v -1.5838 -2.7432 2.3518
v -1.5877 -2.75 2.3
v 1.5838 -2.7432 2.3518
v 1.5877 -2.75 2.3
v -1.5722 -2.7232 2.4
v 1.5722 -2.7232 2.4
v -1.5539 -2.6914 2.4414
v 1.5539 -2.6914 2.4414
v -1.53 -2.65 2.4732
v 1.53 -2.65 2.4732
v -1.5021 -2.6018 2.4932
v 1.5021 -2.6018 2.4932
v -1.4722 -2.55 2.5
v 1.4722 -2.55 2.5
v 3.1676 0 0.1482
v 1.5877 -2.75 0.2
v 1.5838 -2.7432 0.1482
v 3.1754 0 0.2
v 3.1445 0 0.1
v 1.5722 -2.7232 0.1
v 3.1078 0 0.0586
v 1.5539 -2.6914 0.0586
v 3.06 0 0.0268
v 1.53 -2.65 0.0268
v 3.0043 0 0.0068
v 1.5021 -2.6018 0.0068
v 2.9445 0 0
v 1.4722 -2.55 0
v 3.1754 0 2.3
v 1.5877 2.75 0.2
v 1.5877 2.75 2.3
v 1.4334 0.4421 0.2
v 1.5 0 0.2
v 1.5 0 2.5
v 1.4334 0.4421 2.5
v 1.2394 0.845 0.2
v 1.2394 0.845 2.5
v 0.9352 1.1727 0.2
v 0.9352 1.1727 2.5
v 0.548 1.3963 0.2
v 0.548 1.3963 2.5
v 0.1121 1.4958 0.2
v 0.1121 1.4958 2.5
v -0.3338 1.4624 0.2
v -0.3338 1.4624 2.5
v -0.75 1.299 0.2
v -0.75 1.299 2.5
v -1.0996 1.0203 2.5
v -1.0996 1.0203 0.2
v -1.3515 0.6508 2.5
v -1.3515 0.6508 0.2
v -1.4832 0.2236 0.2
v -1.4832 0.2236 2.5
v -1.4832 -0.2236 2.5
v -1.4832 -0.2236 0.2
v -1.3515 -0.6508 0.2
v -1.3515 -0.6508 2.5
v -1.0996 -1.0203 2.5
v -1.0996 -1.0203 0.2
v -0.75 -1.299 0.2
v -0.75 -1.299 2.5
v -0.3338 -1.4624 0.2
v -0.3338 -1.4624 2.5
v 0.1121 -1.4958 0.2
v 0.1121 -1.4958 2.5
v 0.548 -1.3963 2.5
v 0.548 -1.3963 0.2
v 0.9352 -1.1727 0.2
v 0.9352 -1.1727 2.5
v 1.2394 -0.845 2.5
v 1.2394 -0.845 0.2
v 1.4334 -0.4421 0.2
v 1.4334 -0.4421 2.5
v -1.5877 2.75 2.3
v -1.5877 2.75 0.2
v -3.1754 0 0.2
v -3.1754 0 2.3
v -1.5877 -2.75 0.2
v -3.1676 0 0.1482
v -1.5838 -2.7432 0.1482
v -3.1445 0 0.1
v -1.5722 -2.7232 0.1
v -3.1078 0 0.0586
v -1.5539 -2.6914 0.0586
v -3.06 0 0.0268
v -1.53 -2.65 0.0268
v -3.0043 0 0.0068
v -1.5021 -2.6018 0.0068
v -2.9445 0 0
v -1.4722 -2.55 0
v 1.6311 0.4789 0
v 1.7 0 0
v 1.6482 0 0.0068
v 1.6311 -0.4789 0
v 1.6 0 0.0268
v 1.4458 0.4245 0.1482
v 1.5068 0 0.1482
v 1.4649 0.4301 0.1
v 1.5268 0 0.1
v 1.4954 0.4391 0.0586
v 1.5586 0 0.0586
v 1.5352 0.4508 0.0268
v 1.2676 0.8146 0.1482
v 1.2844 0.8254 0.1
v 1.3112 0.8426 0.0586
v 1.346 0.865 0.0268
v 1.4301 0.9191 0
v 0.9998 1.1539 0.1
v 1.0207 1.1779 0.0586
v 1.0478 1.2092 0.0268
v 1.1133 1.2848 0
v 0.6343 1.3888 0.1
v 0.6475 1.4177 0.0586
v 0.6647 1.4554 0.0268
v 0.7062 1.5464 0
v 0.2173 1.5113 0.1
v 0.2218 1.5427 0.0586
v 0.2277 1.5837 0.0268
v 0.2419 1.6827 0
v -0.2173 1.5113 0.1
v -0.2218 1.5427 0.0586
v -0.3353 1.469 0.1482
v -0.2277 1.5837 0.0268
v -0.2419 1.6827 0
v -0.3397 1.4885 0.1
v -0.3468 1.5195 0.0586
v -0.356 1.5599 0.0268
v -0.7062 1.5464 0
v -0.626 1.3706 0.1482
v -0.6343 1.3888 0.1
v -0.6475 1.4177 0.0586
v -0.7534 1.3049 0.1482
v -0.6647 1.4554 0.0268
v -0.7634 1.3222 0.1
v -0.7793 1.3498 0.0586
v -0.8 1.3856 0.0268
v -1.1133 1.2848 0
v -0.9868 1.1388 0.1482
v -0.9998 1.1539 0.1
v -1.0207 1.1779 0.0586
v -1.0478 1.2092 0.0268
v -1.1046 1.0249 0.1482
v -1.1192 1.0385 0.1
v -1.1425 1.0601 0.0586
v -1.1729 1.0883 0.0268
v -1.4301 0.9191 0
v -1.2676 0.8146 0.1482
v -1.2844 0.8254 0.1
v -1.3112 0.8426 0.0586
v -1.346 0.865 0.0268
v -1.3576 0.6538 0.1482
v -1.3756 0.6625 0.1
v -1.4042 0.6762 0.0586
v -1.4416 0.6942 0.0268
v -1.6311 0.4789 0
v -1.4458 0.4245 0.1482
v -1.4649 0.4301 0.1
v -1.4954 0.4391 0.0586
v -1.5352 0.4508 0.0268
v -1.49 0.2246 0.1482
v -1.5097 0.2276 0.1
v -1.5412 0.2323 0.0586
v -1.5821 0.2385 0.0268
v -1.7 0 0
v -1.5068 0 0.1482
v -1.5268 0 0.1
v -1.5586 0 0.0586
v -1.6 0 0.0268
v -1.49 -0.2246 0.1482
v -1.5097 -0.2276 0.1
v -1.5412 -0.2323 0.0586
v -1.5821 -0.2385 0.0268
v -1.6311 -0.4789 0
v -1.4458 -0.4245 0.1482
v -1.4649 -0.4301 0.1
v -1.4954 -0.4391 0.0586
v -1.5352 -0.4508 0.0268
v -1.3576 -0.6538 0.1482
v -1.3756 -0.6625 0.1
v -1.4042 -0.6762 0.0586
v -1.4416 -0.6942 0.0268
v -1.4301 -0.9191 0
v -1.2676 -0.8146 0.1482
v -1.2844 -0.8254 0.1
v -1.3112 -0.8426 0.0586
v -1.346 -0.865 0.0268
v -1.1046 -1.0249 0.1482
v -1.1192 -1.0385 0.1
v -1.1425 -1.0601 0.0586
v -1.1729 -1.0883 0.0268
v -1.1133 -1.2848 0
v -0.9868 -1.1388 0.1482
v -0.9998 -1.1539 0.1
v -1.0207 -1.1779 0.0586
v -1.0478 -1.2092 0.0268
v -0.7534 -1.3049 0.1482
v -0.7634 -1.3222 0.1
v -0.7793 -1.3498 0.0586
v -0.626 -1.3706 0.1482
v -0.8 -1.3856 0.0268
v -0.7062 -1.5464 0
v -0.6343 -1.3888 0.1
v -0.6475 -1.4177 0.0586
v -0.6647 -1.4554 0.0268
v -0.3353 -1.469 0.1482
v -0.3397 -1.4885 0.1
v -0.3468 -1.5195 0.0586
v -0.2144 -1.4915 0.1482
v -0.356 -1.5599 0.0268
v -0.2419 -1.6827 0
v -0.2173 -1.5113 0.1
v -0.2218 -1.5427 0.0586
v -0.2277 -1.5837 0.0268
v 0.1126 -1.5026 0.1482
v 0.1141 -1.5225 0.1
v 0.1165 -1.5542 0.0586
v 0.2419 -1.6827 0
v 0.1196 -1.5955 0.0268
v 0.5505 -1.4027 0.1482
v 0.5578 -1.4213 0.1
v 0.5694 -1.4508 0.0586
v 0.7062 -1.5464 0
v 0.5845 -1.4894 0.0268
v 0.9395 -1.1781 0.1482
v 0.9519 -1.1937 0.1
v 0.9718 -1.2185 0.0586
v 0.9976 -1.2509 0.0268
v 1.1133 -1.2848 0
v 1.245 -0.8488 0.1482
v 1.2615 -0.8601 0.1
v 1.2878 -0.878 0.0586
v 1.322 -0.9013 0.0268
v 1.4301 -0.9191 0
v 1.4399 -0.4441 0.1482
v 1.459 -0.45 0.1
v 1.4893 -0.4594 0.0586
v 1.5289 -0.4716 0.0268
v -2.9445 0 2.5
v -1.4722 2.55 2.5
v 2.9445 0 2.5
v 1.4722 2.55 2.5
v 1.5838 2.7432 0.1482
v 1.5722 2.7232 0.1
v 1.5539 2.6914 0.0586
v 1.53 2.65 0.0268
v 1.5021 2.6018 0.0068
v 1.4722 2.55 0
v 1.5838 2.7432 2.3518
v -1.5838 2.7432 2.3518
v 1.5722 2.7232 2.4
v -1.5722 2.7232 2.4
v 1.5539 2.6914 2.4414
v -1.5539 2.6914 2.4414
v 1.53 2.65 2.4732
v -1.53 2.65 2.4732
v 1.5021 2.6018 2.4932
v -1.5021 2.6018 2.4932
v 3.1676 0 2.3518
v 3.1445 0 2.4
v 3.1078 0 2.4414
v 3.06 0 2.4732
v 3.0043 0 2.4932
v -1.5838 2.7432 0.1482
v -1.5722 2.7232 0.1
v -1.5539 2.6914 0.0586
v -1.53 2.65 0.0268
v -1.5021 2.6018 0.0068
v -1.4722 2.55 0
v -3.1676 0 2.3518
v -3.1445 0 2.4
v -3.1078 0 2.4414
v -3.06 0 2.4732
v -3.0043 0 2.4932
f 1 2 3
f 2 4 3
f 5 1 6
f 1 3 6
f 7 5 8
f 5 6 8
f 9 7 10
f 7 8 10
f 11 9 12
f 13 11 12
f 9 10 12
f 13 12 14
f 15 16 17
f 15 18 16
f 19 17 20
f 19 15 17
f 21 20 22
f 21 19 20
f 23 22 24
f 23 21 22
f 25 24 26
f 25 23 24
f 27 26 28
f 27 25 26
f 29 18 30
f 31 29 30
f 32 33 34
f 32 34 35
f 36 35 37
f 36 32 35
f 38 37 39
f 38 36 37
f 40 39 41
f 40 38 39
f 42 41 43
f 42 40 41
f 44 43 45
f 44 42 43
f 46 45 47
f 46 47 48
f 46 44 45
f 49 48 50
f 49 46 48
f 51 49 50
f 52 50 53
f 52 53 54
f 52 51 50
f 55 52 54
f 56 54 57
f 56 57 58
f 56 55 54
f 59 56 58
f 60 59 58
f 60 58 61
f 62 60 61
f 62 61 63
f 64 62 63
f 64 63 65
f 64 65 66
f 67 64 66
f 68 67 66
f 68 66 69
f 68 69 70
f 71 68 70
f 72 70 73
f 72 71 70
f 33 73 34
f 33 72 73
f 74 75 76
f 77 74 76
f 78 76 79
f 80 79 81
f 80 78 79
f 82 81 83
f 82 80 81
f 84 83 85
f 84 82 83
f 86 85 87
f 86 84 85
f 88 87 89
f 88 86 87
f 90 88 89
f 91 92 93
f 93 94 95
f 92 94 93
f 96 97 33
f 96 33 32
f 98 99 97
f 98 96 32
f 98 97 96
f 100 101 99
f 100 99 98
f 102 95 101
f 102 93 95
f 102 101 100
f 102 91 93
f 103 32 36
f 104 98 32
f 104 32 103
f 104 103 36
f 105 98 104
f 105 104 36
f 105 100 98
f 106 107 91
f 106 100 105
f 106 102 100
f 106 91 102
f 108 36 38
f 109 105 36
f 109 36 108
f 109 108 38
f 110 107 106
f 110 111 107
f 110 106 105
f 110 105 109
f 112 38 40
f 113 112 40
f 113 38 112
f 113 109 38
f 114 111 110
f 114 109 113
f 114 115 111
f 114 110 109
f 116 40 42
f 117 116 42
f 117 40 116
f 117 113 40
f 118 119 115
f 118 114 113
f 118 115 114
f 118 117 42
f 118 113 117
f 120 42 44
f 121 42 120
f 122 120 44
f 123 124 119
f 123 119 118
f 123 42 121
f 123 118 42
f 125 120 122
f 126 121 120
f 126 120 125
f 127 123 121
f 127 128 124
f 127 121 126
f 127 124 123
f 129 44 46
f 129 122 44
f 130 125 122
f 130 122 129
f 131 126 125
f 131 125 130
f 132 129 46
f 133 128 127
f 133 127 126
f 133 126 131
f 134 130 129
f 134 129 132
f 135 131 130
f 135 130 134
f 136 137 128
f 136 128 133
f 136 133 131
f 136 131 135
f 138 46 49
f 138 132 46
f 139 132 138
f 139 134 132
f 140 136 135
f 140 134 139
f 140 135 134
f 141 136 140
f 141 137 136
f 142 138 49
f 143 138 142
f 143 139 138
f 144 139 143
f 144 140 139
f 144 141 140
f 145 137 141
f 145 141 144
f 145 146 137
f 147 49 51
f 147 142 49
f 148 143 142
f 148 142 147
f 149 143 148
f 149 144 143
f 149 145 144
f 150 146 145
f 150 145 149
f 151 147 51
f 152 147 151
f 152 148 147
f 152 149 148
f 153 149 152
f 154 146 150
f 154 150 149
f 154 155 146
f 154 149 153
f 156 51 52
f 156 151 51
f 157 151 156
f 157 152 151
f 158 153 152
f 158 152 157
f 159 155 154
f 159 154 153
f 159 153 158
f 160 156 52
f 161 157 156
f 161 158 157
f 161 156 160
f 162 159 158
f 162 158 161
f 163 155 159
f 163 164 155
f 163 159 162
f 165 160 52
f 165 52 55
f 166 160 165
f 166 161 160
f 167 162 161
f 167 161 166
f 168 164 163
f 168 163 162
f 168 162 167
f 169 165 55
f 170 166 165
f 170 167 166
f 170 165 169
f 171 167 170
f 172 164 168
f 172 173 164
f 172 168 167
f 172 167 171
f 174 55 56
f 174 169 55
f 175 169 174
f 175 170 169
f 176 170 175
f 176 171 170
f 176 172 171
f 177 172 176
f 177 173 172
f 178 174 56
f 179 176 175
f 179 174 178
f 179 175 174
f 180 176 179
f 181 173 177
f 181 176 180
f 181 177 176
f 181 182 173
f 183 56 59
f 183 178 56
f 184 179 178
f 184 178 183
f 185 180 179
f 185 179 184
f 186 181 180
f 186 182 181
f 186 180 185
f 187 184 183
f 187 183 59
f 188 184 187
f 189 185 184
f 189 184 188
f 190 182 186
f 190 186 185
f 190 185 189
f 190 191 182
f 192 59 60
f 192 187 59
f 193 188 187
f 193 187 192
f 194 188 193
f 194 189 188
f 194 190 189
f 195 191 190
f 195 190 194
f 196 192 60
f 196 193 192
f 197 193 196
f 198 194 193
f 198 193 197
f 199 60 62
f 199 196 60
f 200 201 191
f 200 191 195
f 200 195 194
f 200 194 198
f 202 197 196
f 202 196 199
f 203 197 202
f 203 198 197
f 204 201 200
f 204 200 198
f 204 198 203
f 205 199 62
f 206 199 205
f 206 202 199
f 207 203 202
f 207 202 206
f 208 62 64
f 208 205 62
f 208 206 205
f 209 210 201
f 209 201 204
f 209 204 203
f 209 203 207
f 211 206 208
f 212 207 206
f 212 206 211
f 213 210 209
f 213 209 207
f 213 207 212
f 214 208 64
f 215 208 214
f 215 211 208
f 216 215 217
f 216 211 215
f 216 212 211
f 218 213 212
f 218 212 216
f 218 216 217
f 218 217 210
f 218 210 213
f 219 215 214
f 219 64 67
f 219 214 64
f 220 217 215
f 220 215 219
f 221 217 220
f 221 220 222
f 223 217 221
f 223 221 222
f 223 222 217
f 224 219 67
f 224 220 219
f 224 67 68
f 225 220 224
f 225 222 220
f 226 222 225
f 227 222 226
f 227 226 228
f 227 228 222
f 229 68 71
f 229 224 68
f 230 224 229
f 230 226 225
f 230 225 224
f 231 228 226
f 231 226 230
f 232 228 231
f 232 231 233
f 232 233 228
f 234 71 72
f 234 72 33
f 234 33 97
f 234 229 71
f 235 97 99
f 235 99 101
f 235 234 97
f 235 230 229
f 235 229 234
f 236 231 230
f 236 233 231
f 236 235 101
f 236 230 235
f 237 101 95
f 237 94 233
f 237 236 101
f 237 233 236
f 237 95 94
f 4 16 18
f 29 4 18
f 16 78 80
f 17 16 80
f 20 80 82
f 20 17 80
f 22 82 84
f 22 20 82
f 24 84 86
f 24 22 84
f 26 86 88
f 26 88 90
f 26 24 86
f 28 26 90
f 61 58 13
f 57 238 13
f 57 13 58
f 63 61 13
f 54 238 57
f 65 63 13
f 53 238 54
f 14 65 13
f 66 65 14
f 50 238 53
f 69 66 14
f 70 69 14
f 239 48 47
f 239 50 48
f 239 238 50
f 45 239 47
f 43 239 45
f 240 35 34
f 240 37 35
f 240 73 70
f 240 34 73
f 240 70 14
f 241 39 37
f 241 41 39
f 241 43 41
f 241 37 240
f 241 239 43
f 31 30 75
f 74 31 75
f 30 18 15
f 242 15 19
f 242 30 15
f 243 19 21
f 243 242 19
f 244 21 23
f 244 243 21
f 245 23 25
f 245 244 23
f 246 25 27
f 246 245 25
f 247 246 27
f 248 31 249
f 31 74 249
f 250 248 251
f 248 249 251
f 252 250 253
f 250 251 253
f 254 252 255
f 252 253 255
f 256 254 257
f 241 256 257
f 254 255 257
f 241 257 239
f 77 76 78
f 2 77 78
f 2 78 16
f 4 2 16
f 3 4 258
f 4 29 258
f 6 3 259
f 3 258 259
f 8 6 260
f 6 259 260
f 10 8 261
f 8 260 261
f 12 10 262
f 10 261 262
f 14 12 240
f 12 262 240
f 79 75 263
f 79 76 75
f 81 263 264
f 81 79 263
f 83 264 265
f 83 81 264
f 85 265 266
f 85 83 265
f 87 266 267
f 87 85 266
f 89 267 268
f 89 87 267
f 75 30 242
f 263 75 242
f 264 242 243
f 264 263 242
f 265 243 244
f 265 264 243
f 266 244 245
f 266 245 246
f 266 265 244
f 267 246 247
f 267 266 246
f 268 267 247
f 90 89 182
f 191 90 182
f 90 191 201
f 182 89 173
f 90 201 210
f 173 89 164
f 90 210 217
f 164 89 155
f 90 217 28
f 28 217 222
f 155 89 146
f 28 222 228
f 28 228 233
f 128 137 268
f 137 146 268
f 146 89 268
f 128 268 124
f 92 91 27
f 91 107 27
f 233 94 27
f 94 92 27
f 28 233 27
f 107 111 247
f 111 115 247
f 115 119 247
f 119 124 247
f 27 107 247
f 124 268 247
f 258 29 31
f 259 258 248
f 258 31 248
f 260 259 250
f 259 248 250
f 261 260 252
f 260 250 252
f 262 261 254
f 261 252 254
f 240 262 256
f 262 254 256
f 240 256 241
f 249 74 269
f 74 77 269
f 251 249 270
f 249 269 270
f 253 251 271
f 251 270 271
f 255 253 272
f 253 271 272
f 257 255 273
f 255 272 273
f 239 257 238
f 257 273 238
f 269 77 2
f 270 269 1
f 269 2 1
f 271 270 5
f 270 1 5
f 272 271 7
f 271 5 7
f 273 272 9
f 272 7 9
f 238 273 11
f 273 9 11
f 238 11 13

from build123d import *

# Parameters (mm, degrees)
SKETCH_1_R      = 1.5
EXTRUDE_1_DEPTH = 2.5
FILLET_1_R      = 0.2


with BuildPart() as part:
    # 草图1 → 凸台-拉伸1 (new body)
    with BuildSketch(Plane.XY):
        Polygon((1.58771324, -2.75), (3.175426481, 0), (1.58771324, 2.75), (-1.58771324, 2.75), (-3.175426481, 0), (-1.58771324, -2.75), align=None)
        Circle(SKETCH_1_R, mode=Mode.SUBTRACT)
    extrude(amount=EXTRUDE_1_DEPTH)

    # 圆角1
    fillet_1_edges = [part.edges().sort_by_distance(p)[0] for p in [
        (2.38156986, 1.375, 2.5),
        (0, 2.75, 2.5),
        (-1.5, 0, 0),
        (-2.38156986, 1.375, 2.5),
        (-2.38156986, -1.375, 2.5),
        (0, -2.75, 2.5),
        (-2.38156986, -1.375, 0),
        (-2.38156986, 1.375, 0),
        (0, 2.75, 0),
        (2.38156986, 1.375, 0),
        (2.38156986, -1.375, 0),
        (0, -2.75, 0),
        (2.38156986, -1.375, 2.5),
    ]]
    fillet(fillet_1_edges, radius=FILLET_1_R)


solid = part.part
